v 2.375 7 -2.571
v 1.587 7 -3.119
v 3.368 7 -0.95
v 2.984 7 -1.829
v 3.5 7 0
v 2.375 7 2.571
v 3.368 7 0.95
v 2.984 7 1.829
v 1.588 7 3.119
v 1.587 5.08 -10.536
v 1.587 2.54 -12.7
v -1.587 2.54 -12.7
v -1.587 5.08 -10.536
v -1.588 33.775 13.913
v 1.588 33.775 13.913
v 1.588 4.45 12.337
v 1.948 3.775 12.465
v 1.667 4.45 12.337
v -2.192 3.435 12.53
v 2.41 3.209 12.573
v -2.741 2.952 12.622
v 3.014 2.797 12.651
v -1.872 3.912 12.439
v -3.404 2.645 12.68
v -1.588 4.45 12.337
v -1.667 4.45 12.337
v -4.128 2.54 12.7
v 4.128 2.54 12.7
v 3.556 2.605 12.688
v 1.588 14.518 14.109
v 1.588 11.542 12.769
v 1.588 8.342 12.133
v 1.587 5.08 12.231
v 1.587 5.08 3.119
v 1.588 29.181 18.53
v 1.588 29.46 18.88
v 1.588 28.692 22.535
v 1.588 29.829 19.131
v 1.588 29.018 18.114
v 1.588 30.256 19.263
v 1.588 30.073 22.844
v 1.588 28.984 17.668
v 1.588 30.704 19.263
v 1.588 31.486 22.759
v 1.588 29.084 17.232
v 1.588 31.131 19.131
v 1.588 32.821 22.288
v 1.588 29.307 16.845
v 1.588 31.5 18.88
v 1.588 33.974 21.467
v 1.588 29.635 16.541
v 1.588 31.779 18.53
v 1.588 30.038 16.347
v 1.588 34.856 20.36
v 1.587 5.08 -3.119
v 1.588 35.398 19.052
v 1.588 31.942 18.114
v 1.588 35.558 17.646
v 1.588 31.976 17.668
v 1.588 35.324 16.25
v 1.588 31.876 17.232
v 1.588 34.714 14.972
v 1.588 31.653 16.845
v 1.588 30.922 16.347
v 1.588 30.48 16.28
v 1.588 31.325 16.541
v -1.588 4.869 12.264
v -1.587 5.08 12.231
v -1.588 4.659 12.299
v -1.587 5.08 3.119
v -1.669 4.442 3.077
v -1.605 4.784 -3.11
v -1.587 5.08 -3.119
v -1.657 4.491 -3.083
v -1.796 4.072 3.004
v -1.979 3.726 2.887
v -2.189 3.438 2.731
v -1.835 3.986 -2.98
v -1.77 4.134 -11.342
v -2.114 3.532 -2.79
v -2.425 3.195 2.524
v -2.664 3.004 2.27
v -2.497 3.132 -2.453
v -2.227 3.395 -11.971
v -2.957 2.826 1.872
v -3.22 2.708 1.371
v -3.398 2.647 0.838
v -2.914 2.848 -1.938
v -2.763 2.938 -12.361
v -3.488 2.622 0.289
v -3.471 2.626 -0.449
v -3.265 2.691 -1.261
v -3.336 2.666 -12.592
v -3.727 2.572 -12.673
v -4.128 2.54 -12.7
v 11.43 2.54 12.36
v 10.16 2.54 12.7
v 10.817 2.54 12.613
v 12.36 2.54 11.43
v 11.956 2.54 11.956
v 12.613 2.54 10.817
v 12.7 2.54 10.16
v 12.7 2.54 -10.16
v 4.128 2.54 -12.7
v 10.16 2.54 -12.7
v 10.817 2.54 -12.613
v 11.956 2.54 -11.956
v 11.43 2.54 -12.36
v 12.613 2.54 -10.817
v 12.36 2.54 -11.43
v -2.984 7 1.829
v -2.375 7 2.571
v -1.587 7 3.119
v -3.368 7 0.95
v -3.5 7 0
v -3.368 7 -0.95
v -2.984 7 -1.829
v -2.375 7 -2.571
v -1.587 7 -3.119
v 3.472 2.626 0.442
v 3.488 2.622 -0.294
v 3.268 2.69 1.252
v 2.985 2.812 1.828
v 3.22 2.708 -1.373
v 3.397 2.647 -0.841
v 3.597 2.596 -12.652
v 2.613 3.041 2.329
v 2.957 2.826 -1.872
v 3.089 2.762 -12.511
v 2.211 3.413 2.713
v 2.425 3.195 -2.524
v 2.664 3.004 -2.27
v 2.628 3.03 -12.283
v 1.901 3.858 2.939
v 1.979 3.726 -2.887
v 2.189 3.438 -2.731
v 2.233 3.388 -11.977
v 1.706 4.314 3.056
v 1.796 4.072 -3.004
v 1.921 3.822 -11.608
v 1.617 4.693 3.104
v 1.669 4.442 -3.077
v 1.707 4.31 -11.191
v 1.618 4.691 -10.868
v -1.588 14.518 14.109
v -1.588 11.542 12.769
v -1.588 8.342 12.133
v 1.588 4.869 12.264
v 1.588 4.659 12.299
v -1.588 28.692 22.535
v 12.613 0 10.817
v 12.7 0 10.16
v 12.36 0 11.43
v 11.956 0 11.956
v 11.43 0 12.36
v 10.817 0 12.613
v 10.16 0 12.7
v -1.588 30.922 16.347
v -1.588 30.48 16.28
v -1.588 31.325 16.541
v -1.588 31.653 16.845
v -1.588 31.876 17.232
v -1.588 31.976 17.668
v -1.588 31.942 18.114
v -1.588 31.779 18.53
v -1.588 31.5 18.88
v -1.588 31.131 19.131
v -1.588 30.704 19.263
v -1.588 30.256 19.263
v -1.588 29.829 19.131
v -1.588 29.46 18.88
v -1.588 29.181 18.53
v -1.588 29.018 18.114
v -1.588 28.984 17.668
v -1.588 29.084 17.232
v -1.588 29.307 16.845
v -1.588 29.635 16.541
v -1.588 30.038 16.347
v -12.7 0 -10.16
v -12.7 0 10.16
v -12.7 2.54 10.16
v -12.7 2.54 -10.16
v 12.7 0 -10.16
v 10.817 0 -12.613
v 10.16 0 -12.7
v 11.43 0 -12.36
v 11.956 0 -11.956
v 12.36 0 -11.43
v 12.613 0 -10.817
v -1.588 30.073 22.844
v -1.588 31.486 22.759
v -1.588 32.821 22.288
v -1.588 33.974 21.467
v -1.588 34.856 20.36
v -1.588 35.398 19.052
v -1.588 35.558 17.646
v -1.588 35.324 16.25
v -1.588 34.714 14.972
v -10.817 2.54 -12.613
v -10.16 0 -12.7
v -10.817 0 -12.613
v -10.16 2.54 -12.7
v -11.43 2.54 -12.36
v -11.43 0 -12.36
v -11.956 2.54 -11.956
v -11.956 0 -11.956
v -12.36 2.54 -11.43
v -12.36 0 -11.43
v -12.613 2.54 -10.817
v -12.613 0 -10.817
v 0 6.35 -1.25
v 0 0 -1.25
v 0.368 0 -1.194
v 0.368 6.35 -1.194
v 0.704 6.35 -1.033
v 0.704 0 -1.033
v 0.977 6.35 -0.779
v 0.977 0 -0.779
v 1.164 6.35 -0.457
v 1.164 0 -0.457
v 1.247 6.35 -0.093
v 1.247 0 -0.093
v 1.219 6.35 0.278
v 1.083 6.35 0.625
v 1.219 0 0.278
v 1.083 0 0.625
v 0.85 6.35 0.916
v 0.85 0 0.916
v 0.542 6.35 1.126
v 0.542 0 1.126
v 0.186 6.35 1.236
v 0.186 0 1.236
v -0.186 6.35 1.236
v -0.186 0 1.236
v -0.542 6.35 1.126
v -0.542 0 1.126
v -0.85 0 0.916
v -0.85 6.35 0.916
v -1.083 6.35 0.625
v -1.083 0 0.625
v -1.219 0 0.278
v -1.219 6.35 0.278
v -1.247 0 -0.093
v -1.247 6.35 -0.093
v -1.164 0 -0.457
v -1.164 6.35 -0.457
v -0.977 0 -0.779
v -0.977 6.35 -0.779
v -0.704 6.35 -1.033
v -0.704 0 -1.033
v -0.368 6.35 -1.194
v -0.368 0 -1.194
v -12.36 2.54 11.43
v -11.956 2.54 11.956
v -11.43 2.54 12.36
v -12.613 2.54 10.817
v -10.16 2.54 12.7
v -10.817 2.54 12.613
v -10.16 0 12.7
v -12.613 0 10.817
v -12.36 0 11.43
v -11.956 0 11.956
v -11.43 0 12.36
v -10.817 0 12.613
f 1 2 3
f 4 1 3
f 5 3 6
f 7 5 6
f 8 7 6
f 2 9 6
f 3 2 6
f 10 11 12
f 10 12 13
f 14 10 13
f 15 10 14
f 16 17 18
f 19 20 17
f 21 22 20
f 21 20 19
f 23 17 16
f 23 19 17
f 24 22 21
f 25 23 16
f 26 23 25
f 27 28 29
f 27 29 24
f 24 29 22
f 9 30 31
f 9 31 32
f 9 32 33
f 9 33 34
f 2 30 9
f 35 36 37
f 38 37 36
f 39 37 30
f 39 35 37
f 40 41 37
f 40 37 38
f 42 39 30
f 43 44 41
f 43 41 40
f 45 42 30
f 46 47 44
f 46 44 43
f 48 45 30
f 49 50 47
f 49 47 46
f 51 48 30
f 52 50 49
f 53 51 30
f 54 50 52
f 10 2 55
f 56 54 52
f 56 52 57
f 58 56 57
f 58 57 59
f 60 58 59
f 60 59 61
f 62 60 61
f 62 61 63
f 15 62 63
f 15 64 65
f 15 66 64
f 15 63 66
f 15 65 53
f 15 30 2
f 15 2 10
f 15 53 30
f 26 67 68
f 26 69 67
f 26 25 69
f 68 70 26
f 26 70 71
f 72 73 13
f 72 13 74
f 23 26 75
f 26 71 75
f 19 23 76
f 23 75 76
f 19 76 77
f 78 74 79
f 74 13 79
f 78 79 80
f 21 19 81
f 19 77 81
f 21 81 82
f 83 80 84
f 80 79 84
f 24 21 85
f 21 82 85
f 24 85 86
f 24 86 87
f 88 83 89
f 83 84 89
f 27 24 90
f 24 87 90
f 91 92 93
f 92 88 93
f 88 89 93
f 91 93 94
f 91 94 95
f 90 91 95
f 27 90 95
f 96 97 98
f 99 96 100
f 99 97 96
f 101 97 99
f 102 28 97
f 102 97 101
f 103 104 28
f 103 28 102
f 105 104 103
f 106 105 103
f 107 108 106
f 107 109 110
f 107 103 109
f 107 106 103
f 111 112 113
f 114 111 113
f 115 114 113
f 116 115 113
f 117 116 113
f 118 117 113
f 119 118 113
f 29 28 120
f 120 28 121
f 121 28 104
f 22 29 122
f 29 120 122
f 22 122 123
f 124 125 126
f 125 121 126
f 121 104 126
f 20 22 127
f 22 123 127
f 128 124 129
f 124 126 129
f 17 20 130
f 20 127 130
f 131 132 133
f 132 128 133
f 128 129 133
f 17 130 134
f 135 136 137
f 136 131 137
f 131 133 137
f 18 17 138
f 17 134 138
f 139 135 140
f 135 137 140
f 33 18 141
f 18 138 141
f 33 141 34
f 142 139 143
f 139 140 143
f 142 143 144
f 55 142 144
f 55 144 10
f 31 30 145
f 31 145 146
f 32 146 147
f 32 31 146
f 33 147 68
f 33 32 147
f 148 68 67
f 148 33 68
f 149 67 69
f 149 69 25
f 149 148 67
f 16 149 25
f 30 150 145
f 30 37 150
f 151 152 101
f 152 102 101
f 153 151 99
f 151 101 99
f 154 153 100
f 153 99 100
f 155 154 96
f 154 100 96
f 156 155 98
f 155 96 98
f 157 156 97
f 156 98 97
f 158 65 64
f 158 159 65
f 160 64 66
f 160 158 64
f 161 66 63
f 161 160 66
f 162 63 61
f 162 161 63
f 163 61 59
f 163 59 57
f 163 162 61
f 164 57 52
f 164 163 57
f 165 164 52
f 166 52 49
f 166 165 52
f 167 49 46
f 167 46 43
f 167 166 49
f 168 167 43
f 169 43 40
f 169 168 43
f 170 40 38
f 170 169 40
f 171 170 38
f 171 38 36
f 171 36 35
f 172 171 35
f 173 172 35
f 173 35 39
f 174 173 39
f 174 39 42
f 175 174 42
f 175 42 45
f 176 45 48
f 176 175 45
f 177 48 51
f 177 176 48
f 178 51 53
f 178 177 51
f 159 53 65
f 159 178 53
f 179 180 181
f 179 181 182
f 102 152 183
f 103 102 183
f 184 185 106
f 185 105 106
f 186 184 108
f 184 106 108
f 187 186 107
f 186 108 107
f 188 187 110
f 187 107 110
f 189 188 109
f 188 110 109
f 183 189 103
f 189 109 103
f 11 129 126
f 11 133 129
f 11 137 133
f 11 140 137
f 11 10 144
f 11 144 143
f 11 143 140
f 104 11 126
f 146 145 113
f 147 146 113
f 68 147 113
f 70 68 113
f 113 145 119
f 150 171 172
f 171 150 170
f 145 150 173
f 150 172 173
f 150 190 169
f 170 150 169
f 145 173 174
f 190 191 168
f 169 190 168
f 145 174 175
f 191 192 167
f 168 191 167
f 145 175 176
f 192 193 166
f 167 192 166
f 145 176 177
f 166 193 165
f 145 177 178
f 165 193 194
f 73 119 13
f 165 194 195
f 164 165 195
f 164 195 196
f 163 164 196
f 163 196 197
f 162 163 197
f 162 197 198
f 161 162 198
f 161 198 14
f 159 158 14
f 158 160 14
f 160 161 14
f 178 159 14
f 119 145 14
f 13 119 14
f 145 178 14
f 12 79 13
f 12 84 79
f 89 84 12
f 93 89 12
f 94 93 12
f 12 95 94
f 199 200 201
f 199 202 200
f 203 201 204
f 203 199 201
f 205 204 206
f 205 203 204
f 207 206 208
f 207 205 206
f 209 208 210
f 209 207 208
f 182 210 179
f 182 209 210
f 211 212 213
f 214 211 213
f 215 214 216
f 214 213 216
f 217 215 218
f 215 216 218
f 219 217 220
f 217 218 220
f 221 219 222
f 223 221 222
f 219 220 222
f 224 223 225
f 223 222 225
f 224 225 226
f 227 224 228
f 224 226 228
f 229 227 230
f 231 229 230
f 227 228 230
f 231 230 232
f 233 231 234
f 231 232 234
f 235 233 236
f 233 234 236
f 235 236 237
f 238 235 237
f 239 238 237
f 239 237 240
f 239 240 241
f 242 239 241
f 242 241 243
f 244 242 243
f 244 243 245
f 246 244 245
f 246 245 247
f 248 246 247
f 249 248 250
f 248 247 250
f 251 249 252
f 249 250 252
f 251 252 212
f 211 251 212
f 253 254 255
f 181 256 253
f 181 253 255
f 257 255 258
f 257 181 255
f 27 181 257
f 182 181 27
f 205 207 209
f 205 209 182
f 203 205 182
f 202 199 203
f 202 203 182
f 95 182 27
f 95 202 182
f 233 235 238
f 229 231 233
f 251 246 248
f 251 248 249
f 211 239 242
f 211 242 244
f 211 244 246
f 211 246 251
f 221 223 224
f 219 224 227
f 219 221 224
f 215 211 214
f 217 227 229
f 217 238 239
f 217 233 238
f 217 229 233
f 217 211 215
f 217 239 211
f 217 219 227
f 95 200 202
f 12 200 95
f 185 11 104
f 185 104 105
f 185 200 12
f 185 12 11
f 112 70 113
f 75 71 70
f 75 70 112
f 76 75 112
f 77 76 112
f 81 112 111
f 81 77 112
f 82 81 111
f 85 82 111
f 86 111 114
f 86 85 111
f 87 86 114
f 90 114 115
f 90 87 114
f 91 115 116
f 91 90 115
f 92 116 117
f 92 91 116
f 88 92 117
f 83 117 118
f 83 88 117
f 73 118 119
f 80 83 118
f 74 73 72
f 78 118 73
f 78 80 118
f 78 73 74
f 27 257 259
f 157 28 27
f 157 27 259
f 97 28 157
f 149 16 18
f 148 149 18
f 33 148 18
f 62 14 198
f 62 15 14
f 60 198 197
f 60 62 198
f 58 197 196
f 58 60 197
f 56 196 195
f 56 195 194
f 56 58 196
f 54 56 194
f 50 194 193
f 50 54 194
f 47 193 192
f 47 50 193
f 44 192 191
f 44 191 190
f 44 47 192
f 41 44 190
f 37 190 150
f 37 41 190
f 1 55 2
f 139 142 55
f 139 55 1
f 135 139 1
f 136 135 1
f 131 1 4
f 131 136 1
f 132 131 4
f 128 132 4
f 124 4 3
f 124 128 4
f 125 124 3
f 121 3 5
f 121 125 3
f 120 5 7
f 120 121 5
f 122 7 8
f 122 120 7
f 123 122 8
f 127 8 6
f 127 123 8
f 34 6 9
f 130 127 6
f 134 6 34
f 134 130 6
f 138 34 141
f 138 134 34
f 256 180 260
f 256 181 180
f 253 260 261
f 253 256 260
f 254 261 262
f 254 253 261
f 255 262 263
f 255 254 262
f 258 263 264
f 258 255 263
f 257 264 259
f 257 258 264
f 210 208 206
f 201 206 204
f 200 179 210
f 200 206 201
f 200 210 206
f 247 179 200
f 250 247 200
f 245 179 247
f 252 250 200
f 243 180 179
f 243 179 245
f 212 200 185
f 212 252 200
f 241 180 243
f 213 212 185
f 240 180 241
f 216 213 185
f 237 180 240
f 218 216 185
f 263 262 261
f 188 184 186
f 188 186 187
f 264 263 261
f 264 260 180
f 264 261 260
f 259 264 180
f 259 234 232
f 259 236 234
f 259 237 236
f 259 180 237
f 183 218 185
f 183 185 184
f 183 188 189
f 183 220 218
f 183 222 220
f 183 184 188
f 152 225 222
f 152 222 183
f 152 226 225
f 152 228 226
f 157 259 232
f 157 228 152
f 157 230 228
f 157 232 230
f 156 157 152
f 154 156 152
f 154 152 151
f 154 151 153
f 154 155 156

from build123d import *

# Parameters (mm, degrees)
SKETCH1_W           = 25.4
SKETCH1_H           = 25.4
BOSS_EXTRUDE1_DEPTH = 2.54
SKETCH3_R           = 1.5
BOSS_EXTRUDE2_DEPTH = 1.5875
FILLET1_START       = -12.7000001
FILLET1_DEPTH       = 25.4000001
FILLET1_START_2     = -5
FILLET1_2_DEPTH     = 10
FILLET2_R           = 2.54
SKETCH4_R           = 3.5
BOSS_EXTRUDE3_DEPTH = 7
SKETCH5_R           = 1.25
CUT_EXTRUDE1_DEPTH  = 6.35


with BuildPart() as part:
    # Sketch1 → Boss-Extrude1 (new body)
    with BuildSketch(Plane(origin=(0, 0, 0), x_dir=(1, 0, 0), z_dir=(0, 1, 0))):
        Rectangle(SKETCH1_W, SKETCH1_H)
    extrude(amount=BOSS_EXTRUDE1_DEPTH)

    # Sketch3 → Boss-Extrude2 (add, symmetric)
    with BuildSketch(Plane(origin=(0, 0, 0), x_dir=(0, 0, -1), z_dir=(1, 0, 0))):
        with BuildLine():
            Line((-22.53488, 28.69184), (-14.109077454, 14.518123111))
            ThreePointArc((-14.109077454, 14.518123111), (-12.301446379, 9.646212675), (-12.336895325, 4.449888515))
            Line((-12.336895325, 4.449888515), (-12.7, 2.54))
            Line((-12.7, 2.54), (12.7, 2.54))
            Line((12.7, 2.54), (-13.91324895, 33.774637509))
            ThreePointArc((-13.91324895, 33.774637509), (-20.359903271, 34.856128324), (-22.53488, 28.69184))
        make_face()
        with Locations((-17.78, 30.48)):
            Circle(SKETCH3_R, mode=Mode.SUBTRACT)
    extrude(amount=BOSS_EXTRUDE2_DEPTH, both=True)

    # Fillet1: read off the stored shape, not the designer's step
    # Fillet1 outline → Fillet1 (add)
    with BuildSketch(Plane.XY.offset(FILLET1_START)):
        with BuildLine():
            ThreePointArc((-1.5875, 5.08), (-2.331448776, 3.283948776), (-4.1275, 2.54))
            Line((-4.1275, 2.54), (-1.5875, 2.54))
            Line((-1.5875, 2.54), (-1.5875, 5.08))
        make_face()
        with BuildLine():
            Line((1.5875, 2.54), (4.1275, 2.54))
            ThreePointArc((4.1275, 2.54), (2.331448776, 3.283948776), (1.5875, 5.08))
            Line((1.5875, 5.08), (1.5875, 2.54))
        make_face()
    extrude(amount=FILLET1_DEPTH)

    # Fillet1 2 outline → Fillet1 2 (cut)
    with BuildSketch(Plane.YZ.offset(FILLET1_START_2)):
        Polygon((5.08, -10.535811211), (2.54, -12.7), (5.08, -12.7000001), align=None)
        with BuildLine():
            Line((5.08, 12.7), (2.54, 12.7))
            Line((2.54, 12.7), (4.449888515, 12.336895325))
            ThreePointArc((4.449888515, 12.336895325), (4.764360857, 12.280707955), (5.08, 12.231496116))
            Line((5.08, 12.231496116), (5.08, 12.7))
        make_face()
    extrude(amount=FILLET1_2_DEPTH, mode=Mode.SUBTRACT)

    # Fillet2
    fillet2_edges = [part.edges().sort_by_distance(p)[0] for p in [
        (12.7, 1.27, -12.7),
        (12.7, 1.27, 12.7),
        (-12.7, 1.27, 12.7),
        (-12.7, 1.27, -12.7),
    ]]
    fillet(fillet2_edges, radius=FILLET2_R)

    # Sketch4 → Boss-Extrude3 (add)
    with BuildSketch(Plane.XZ):
        Circle(SKETCH4_R)
    extrude(amount=-BOSS_EXTRUDE3_DEPTH)

    # Sketch5 → Cut-Extrude1 (cut)
    with BuildSketch(Plane.XZ):
        with Locations(Location((0, 0, 0), (0, 0, 270))):
            Circle(SKETCH5_R)
    extrude(amount=-CUT_EXTRUDE1_DEPTH, mode=Mode.SUBTRACT)


solid = part.part
